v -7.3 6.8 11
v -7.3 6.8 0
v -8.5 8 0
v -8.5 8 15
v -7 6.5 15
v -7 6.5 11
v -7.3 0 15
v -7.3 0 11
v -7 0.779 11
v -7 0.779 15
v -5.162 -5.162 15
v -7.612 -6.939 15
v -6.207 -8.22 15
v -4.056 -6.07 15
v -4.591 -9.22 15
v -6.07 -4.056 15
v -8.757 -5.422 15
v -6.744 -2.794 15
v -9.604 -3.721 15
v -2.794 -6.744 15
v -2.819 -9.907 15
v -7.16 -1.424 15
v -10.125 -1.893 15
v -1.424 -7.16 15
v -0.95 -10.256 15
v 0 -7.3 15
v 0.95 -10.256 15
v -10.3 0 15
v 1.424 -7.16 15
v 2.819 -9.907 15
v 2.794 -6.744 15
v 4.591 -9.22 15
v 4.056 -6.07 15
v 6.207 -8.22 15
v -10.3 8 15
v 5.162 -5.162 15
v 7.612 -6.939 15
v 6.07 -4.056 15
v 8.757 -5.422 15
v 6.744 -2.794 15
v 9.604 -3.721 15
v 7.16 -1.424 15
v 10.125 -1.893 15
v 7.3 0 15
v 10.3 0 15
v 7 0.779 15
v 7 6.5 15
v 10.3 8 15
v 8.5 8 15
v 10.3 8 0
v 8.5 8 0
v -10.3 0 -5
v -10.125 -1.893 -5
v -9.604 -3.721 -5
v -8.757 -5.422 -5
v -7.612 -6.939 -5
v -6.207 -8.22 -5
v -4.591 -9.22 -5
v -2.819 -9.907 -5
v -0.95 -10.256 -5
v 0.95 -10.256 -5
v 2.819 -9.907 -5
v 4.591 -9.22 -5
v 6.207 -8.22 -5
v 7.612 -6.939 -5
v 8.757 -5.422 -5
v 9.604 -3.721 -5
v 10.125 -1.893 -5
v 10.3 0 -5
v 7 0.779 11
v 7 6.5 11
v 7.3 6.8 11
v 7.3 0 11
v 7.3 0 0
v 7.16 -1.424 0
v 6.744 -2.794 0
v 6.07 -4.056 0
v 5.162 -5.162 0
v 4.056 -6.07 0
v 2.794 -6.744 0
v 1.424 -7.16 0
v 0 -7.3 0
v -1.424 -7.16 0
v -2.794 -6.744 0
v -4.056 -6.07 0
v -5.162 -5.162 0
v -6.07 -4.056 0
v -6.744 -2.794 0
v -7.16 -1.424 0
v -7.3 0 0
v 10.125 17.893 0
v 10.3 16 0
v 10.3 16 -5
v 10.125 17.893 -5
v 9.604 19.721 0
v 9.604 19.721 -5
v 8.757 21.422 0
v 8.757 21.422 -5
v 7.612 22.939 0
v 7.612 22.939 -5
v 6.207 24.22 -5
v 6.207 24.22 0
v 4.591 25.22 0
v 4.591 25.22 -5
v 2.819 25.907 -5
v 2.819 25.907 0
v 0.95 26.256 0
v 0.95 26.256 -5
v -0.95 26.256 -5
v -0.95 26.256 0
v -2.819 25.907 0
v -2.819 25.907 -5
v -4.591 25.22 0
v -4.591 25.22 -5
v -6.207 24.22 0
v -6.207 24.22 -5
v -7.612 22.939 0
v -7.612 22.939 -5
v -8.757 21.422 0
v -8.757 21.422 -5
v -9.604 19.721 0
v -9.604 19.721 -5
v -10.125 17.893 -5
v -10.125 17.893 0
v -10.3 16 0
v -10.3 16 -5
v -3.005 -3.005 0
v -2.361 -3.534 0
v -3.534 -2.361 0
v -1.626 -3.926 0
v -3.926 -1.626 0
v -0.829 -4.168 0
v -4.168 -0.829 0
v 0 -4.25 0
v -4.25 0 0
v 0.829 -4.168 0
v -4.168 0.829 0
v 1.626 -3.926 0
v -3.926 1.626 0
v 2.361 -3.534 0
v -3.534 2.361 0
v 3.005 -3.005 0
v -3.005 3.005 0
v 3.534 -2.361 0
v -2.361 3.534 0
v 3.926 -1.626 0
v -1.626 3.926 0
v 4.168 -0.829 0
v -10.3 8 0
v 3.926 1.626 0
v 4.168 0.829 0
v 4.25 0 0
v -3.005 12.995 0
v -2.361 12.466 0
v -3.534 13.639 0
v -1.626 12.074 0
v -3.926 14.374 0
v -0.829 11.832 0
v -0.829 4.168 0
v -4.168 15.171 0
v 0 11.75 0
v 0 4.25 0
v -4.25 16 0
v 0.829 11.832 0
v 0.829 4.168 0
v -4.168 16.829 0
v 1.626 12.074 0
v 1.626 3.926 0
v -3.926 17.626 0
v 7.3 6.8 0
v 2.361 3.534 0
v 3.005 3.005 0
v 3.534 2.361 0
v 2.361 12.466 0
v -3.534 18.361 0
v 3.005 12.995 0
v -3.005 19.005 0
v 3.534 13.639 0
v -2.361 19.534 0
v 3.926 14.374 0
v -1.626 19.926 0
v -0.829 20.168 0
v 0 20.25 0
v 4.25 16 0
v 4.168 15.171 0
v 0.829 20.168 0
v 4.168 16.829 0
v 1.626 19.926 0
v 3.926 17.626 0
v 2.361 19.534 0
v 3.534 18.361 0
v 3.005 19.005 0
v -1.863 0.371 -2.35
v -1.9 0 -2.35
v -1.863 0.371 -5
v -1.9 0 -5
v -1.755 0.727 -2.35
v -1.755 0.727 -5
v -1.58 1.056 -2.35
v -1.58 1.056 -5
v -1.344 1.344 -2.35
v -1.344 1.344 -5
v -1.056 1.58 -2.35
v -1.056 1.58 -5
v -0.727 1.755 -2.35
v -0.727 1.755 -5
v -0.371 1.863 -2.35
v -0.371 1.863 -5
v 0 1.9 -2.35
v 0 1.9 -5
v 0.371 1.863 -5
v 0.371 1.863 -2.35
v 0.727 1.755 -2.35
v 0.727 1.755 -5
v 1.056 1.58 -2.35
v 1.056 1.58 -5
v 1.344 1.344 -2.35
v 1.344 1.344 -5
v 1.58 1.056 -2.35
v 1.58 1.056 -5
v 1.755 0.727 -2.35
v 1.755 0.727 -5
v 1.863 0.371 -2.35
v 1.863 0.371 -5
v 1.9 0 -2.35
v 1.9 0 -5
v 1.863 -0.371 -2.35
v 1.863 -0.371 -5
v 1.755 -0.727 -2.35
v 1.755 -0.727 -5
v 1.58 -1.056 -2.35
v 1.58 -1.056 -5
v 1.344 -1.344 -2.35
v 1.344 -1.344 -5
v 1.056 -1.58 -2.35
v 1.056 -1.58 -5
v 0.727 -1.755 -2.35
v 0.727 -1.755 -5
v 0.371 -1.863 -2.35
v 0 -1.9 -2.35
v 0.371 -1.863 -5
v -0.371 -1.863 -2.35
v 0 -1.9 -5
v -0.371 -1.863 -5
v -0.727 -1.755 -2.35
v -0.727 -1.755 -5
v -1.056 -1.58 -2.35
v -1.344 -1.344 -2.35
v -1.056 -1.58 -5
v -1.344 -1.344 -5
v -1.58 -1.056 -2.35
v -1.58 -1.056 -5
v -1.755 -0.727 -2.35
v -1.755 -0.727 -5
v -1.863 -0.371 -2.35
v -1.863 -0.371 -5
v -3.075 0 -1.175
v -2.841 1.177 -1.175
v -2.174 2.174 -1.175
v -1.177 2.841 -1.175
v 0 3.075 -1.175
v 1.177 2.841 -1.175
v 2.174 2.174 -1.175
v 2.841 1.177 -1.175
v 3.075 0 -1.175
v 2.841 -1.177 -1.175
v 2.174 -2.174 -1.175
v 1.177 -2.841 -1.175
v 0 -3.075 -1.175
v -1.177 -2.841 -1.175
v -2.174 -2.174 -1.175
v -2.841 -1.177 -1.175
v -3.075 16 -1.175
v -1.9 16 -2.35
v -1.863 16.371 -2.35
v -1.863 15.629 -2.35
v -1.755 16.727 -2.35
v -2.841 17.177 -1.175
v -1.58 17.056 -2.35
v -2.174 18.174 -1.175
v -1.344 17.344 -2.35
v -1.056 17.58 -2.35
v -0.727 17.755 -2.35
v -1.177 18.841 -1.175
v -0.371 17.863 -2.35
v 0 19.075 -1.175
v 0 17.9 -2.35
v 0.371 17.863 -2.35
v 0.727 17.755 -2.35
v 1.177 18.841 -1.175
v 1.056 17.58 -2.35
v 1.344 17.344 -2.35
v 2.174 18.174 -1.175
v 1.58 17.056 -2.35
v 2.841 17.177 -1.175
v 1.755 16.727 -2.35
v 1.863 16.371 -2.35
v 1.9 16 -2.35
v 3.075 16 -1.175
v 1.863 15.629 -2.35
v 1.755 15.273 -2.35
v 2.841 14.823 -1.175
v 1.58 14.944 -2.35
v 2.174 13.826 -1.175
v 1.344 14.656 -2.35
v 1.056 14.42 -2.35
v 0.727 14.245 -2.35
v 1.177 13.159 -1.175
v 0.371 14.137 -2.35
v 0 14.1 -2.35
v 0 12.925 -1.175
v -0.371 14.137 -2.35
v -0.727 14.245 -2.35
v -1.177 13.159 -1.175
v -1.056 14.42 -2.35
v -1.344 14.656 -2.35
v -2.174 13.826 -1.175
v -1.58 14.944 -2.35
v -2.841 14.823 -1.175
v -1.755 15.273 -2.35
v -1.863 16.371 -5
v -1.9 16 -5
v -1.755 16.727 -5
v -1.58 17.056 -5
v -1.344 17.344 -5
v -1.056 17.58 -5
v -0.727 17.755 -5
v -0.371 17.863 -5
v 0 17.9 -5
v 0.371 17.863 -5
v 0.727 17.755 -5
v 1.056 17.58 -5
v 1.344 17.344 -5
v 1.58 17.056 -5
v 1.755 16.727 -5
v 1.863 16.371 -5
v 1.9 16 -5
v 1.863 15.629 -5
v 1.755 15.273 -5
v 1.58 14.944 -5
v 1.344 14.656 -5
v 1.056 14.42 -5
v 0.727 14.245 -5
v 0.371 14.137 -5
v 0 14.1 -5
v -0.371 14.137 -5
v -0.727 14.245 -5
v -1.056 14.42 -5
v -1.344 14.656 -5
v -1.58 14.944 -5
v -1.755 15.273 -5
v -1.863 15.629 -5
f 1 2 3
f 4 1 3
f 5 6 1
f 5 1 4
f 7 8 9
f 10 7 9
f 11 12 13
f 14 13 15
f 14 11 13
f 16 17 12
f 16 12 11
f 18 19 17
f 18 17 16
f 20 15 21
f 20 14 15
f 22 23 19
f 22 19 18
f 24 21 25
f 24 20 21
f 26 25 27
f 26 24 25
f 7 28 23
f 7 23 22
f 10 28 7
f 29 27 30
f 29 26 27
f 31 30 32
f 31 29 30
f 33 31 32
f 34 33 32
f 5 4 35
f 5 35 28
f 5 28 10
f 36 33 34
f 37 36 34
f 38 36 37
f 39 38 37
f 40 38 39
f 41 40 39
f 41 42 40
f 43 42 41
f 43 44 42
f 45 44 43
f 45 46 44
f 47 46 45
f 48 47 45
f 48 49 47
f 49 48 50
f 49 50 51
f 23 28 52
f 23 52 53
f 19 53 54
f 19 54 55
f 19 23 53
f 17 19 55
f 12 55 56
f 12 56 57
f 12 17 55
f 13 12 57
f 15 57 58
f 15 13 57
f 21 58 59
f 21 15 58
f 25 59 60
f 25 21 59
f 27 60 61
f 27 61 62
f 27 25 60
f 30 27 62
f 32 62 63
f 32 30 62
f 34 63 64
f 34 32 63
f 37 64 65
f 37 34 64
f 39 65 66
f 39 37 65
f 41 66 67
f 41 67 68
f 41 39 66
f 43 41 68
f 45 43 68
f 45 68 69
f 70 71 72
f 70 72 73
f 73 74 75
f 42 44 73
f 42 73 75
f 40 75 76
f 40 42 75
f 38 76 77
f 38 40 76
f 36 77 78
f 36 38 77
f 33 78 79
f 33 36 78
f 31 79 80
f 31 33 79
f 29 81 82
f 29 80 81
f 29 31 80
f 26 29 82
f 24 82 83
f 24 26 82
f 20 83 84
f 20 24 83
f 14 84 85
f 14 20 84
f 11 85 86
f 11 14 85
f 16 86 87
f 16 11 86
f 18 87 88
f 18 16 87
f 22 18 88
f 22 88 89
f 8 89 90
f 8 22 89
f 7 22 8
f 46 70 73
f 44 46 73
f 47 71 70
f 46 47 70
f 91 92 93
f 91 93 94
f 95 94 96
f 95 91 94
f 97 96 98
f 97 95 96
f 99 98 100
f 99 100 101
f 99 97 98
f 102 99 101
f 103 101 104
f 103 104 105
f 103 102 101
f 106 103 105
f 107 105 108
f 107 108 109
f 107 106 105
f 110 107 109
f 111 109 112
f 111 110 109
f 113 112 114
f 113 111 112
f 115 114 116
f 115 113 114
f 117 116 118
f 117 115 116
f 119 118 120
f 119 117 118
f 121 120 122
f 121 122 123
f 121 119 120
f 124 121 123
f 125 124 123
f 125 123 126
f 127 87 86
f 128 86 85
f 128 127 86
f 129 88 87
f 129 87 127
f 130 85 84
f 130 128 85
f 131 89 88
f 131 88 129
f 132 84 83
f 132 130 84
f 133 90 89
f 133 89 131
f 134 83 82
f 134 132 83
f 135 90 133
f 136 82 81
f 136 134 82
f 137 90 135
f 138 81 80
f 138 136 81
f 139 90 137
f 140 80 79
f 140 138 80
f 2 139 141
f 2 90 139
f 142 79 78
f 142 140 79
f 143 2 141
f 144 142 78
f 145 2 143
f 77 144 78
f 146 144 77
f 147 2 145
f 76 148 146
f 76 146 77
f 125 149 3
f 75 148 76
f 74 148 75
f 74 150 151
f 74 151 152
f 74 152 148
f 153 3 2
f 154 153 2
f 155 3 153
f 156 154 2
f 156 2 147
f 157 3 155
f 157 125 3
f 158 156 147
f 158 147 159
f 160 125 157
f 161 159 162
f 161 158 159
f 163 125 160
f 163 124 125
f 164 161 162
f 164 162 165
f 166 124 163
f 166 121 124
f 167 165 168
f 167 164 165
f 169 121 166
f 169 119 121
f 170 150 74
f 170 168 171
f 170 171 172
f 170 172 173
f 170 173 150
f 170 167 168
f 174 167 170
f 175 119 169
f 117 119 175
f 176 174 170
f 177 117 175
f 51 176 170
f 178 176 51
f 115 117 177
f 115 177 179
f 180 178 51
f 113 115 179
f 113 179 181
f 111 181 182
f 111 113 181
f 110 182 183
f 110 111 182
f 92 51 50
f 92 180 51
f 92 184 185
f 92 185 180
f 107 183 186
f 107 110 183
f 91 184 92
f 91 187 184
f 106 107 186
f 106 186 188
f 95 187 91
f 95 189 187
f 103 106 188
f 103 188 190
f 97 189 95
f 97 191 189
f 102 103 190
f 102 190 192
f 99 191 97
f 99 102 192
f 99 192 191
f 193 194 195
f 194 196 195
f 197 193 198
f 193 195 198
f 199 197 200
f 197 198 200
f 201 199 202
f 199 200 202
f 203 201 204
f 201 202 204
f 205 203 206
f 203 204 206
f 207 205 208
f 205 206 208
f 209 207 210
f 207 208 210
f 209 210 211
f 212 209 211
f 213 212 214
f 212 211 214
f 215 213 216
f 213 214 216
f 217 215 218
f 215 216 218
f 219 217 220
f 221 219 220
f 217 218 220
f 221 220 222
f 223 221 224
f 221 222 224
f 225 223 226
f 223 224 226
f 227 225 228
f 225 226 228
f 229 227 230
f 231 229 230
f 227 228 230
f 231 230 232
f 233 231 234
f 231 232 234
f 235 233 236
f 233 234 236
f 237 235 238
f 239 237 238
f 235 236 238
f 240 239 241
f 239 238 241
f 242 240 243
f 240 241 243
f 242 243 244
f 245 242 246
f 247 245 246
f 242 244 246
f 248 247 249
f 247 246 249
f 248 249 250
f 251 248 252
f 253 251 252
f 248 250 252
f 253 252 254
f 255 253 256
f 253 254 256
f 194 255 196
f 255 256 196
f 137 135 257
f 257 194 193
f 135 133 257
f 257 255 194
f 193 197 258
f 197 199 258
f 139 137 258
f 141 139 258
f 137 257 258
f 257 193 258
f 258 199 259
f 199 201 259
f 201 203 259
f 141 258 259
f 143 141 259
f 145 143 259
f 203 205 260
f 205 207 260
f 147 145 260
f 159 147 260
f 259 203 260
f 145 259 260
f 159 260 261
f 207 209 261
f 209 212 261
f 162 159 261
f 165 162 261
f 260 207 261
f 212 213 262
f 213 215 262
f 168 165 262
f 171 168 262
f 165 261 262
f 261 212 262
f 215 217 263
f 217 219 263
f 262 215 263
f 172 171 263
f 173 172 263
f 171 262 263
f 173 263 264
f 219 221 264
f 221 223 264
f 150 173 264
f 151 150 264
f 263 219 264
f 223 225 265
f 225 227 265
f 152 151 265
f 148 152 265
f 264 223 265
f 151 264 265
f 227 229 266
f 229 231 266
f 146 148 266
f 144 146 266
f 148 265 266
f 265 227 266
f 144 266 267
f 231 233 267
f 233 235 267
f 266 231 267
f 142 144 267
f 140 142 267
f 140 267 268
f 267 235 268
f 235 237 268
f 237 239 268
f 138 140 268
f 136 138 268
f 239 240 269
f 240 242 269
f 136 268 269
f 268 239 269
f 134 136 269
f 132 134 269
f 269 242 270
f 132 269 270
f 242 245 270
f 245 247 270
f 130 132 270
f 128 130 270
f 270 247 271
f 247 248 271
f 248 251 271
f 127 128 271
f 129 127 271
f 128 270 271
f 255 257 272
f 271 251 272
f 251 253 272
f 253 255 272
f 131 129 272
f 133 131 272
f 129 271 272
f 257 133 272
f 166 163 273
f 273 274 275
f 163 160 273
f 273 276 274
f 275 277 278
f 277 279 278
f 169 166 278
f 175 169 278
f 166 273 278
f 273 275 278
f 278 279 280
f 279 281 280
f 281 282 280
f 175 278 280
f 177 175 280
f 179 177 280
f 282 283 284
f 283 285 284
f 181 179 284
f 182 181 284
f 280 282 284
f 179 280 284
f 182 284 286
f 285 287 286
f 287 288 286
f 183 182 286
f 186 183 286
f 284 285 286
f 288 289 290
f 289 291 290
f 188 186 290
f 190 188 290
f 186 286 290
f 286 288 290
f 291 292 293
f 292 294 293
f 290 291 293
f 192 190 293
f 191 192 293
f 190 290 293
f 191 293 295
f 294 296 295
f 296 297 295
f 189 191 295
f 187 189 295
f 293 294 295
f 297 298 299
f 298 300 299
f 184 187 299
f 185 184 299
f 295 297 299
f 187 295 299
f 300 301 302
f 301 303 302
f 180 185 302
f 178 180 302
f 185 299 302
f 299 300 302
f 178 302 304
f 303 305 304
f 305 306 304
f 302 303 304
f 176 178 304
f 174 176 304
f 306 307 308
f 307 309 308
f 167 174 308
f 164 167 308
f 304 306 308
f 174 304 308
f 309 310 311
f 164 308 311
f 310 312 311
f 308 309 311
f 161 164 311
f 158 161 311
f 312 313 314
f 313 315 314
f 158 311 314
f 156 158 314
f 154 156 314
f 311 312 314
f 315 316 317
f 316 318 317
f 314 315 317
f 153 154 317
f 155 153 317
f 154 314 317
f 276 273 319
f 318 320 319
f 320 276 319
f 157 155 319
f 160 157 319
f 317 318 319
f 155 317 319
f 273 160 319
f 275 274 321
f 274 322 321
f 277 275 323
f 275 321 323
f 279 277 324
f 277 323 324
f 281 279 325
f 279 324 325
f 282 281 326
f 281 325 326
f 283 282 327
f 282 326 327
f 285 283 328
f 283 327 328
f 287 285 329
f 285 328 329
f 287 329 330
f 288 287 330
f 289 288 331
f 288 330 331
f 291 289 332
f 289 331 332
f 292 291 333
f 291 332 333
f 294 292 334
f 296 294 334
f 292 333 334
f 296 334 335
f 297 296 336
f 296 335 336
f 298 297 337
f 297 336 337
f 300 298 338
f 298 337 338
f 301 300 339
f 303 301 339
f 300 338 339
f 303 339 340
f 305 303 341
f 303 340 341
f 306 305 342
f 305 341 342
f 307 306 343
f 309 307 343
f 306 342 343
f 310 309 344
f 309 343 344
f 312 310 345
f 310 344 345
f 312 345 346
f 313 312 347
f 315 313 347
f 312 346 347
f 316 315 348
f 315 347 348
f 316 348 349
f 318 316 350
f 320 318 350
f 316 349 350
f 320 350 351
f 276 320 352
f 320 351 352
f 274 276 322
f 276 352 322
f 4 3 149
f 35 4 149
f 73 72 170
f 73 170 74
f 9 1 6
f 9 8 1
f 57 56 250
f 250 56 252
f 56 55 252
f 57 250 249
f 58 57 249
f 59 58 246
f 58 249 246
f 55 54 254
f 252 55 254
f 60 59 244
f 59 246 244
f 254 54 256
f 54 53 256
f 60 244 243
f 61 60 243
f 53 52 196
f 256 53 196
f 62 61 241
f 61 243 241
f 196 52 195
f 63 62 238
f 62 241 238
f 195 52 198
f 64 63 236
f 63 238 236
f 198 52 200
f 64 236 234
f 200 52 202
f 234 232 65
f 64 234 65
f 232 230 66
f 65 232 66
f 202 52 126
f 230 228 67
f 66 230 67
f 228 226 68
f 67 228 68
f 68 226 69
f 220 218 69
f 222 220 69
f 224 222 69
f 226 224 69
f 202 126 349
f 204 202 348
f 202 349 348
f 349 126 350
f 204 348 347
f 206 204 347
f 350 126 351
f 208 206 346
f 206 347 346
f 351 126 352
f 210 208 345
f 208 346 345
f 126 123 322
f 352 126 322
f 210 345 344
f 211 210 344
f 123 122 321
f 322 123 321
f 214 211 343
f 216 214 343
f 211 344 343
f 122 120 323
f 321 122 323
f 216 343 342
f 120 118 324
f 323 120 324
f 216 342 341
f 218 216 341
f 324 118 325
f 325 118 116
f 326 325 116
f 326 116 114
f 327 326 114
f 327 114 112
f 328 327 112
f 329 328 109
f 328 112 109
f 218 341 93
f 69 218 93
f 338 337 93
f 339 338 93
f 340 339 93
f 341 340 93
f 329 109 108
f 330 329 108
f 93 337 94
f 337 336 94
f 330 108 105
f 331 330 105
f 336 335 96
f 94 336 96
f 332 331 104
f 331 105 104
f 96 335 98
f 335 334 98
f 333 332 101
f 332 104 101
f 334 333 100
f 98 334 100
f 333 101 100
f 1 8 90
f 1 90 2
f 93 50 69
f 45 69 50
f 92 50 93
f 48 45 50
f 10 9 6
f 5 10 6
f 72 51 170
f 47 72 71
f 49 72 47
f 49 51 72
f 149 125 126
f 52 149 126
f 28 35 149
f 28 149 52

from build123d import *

# Parameters (mm, degrees)
F1_DEPTH       = 15
F1_DEPTH_BACK  = 5
F2_START       = 11
F2_DEPTH       = 4
F3_DEPTH       = 5
F4_D           = 3.8
F4_CSINK_D     = 8.5
F4_CSINK_ANGLE = 90
F5_SIZE        = 1.5


with BuildPart() as f1:
    # F0 (on Top) → F1 (new body, two sides)
    with BuildSketch(Plane.XY) as f1_sk:
        with BuildLine():
            ThreePointArc((7.3, 0), (0, -7.3), (-7.3, 0))
            Line((-7.3, 0), (-7.3, 8))
            Line((-7.3, 8), (-10.3, 8))
            Line((-10.3, 8), (-10.3, 0))
            ThreePointArc((-10.3, 0), (0, -10.3), (10.3, 0))
            Line((10.3, 0), (10.3, 8))
            Line((10.3, 8), (7.3, 8))
            Line((7.3, 8), (7.3, 0))
        make_face()
    extrude(amount=F1_DEPTH)
    extrude(f1_sk.sketch, amount=-F1_DEPTH_BACK)

    # F0 (on Top) → F2 (join)
    with BuildSketch(Plane.XY.offset(F2_START)):
        Polygon((-7.3, 8), (-7.3, 0), (-7, 0.7787641953), (-7, 8), align=None)
        Polygon((7, 0.7787641953), (7.3, 0), (7.3, 8), (7, 8), align=None)
    extrude(amount=F2_DEPTH)

    # F0 (on Top) → F3 (join)
    with BuildSketch(Plane.XY):
        Polygon((-7.3, 8), (-7.3, 0), (-7, 0.7787641953), (-7, 8), align=None)
        with BuildLine():
            Line((-7, 0.7787641953), (-7.3, 0))
            ThreePointArc((-7.3, 0), (0, -7.3), (7.3, 0))
            Line((7.3, 0), (7, 0.7787641953))
            Line((7, 0.7787641953), (7, 8))
            Line((7, 8), (7.3, 8))
            Line((7.3, 8), (10.3, 8))
            Line((10.3, 8), (10.3, 16))
            ThreePointArc((10.3, 16), (0, 26.3), (-10.3, 16))
            Line((-10.3, 16), (-10.3, 8))
            Line((-10.3, 8), (-7.3, 8))
            Line((-7.3, 8), (-7, 8))
            Line((-7, 8), (-7, 0.7787641953))
        make_face()
        Polygon((7, 0.7787641953), (7.3, 0), (7.3, 8), (7, 8), align=None)
    extrude(amount=-F3_DEPTH)

    # F4 (through all)
    with Locations(Plane.XY):
        with Locations((0, 16), (0, 0)):
            CounterSinkHole(F4_D / 2, F4_CSINK_D / 2, counter_sink_angle=F4_CSINK_ANGLE)

    # F5
    f5_edges = [f1.edges().sort_by_distance(p)[0] for p in [
        (-7, 8, 13),
        (7, 8, 13),
    ]]
    chamfer(f5_edges, length=F5_SIZE)


solid = f1.part
